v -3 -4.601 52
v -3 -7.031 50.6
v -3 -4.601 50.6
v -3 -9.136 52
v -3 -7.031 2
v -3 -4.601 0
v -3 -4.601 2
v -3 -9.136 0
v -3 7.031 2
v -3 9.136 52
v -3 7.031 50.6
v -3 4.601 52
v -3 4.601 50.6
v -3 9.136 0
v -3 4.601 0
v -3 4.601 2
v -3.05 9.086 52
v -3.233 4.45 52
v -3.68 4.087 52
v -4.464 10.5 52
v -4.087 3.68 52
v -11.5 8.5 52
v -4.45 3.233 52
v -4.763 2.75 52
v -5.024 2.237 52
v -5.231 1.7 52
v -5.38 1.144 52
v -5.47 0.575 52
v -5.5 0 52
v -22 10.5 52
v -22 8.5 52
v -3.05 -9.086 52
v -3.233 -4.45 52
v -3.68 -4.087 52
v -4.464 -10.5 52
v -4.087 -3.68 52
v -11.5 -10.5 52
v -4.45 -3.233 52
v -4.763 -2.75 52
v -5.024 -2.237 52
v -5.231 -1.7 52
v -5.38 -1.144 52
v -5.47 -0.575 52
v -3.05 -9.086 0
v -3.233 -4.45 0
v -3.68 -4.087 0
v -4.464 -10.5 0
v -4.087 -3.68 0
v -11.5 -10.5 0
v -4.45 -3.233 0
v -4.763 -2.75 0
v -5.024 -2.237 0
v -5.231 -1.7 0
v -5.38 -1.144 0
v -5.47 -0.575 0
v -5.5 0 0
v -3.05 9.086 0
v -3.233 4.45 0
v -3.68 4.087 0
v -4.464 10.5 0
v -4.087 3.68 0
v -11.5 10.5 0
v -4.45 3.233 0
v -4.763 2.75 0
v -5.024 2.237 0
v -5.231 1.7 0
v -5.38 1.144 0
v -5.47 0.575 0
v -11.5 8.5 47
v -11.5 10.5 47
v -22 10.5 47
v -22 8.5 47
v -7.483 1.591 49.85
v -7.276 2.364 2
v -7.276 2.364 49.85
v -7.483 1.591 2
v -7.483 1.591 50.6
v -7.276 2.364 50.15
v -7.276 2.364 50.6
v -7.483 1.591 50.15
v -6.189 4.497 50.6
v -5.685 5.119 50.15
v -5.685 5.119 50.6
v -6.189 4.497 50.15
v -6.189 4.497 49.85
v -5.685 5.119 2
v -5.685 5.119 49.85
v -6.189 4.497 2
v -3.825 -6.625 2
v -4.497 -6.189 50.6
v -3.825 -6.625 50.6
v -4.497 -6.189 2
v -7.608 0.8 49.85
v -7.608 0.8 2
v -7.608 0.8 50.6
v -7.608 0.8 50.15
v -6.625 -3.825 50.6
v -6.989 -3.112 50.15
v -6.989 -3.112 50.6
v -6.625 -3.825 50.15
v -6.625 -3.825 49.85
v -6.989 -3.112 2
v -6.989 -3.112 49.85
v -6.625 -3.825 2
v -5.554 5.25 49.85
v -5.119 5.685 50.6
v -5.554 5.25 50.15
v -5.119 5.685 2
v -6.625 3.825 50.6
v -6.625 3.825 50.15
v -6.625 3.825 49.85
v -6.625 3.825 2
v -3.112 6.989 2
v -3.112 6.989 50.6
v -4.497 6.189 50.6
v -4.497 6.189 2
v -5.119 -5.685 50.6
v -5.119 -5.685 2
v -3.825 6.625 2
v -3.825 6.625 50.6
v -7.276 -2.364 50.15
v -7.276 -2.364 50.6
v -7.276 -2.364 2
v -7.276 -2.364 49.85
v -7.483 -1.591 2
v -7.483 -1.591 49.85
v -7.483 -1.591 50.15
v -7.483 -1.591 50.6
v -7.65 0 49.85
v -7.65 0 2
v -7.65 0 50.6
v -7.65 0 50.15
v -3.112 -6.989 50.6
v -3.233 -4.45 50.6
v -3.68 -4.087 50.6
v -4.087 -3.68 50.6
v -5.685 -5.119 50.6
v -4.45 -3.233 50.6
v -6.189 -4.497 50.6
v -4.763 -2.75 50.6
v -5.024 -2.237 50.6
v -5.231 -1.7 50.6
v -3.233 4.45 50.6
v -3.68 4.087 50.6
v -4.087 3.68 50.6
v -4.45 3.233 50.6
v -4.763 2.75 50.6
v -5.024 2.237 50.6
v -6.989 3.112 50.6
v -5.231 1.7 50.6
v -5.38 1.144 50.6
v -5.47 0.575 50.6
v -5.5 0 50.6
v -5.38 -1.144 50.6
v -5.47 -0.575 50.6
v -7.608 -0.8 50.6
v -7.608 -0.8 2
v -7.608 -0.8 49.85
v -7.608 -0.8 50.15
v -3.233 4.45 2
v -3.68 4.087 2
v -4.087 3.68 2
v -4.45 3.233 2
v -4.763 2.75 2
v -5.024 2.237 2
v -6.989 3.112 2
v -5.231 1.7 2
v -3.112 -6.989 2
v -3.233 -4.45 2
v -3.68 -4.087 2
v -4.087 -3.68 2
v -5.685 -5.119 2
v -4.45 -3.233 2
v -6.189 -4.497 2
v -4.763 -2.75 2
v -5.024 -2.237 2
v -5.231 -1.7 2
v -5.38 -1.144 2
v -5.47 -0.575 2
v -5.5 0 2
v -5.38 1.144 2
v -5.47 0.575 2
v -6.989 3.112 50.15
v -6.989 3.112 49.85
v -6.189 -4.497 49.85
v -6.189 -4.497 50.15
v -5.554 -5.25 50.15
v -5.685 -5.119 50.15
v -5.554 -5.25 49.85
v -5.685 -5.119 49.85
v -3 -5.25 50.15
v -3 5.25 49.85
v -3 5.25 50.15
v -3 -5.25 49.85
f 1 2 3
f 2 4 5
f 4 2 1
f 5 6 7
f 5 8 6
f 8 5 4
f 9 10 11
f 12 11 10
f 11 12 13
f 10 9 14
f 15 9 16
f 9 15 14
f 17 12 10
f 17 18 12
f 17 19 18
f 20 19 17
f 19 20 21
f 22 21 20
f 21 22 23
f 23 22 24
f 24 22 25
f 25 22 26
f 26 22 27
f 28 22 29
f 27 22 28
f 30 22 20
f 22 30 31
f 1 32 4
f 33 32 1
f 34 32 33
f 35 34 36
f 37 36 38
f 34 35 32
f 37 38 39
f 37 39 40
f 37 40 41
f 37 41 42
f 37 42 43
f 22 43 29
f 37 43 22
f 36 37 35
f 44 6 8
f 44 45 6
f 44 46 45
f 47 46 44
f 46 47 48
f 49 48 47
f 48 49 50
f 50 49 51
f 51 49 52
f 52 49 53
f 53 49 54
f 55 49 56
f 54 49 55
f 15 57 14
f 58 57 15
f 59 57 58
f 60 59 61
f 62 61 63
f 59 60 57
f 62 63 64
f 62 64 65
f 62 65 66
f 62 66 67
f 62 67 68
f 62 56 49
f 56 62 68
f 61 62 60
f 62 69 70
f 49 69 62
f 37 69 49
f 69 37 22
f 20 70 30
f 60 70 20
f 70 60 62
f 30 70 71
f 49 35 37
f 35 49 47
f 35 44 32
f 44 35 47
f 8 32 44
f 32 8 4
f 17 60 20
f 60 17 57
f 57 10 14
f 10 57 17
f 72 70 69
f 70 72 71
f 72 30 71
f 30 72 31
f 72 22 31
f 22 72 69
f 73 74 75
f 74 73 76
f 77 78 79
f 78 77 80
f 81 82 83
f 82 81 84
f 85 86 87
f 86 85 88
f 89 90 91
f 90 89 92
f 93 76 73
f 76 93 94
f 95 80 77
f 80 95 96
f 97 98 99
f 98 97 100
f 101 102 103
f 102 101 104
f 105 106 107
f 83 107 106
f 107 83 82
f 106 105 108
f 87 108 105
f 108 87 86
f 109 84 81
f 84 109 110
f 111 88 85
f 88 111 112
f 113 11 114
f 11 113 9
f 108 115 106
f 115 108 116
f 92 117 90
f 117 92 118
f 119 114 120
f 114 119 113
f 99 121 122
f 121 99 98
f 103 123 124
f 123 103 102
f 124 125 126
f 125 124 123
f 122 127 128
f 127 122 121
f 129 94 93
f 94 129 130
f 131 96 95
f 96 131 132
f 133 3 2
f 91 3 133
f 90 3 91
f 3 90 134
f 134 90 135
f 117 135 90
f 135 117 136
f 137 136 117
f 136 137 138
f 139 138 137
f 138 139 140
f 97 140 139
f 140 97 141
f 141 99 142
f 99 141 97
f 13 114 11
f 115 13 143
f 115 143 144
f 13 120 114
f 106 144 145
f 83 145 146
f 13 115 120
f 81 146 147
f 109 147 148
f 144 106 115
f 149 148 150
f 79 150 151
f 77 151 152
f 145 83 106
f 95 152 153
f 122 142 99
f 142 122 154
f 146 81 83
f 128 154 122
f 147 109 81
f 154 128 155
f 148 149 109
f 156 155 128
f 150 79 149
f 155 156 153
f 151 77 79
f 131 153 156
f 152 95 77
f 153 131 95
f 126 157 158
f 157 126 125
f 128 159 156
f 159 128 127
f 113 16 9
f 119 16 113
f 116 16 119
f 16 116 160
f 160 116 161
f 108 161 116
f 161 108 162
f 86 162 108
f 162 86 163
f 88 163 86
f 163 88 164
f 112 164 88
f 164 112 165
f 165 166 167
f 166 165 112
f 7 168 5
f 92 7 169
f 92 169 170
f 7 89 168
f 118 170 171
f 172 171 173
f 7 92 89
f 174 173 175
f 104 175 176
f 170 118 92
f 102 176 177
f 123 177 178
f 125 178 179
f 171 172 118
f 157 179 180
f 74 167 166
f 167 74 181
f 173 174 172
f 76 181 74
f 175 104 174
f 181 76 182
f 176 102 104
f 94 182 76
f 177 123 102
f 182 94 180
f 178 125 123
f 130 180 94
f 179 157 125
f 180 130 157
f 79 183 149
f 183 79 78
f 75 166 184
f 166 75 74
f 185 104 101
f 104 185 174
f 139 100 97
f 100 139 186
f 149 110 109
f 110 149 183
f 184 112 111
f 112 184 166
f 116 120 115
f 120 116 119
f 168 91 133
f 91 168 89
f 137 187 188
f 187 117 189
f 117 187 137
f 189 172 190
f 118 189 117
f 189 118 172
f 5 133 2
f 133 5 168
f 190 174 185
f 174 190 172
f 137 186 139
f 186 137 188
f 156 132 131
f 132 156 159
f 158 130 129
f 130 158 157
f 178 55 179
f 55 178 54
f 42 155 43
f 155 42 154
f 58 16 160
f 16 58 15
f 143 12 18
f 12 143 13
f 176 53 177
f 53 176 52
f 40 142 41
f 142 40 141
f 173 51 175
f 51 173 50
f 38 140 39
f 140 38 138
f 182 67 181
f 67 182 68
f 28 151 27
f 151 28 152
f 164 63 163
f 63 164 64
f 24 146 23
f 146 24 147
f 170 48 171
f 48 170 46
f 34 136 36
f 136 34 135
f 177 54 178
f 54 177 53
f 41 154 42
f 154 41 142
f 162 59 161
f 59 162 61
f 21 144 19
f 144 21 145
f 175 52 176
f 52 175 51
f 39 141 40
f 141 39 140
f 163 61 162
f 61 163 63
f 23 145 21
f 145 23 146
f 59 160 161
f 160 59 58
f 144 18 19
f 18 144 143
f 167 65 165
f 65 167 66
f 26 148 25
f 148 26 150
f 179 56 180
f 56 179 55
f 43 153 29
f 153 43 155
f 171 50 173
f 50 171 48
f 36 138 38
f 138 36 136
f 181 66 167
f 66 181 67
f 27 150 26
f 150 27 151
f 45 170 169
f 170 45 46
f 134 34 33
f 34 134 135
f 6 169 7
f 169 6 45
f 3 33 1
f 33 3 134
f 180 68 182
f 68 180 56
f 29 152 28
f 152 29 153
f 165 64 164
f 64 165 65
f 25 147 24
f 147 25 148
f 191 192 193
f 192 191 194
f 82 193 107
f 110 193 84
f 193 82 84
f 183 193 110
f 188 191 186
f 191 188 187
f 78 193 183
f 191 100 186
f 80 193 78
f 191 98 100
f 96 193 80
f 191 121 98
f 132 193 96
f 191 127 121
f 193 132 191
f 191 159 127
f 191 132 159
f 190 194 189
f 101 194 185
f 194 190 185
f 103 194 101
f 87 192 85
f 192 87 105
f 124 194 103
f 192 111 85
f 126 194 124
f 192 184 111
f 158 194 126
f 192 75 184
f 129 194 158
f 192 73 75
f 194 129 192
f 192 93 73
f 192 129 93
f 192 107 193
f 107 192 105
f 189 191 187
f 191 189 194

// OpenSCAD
// PRUSA iteration3
// Bearing holders
// GNU GPL v3
// Josef Průša <iam@josefprusa.cz> and contributors
// http://www.reprap.org/wiki/Prusa_Mendel
// http://prusamendel.org

bearing_diameter = 15;
thinwall = 3;
bearing_size = bearing_diameter + 2 * thinwall;
tolerance = 0.15;
bearing_height = 52;

module horizontal_bearing_base(bearings=1) {
  translate(v=[0,0,6]) cube(size = [24,8+bearings*25,12], center = true);
}

module horizontal_bearing_holes(bearings=1) {
  cutter_lenght = 10+bearings*25;
  one_holder_lenght = 8+25;
  holder_lenght = 8+bearings*25;

  // Main bearing cut
  difference() {
    translate(v = [0,0,12]) rotate(a = [90,0,0]) translate(v = [0,0,-cutter_lenght/2]) cylinder(h = cutter_lenght, r = bearing_diameter/2, $fn = 50);
    // Bearing retainers
    translate(v=[0,1-holder_lenght/2,3]) cube(size = [24,6,8], center = true);
    translate(v=[0,-1+holder_lenght/2,3]) cube(size = [24,6,8], center = true);
  }

  // Ziptie cutouts
  ziptie_cut_ofset = 0;

  for (i = [0:bearings-1]) {
    // For easier positioning I move them by half of one
    // bearing holder then add each bearign lenght and then center again
    translate(v = [0,-holder_lenght/2,0]) translate(v = [0,one_holder_lenght/2+i*25,0]) difference(){
      union(){
        translate(v = [0,2-6,12]) rotate(a = [90,0,0]) translate(v = [0,0,0]) cylinder(h = 4, r = 12.5, $fn = 50);
        translate(v = [0,2+6,12]) rotate(a = [90,0,0]) translate(v = [0,0,0]) cylinder(h = 4, r = 12.5, $fn = 50);
      }
      translate(v = [0,10,12]) rotate(a = [90,0,0]) translate(v = [0,0,0]) cylinder(h = 24, r = 10, $fn = 50);
    }
  }
}

module horizontal_bearing_test() {
  difference(){
    horizontal_bearing_base(1);
    horizontal_bearing_holes(1);
  }
  translate(v=[30,0,0]) difference(){
    horizontal_bearing_base(2);
    horizontal_bearing_holes(2);
  }
  translate(v=[60,0,0]) difference(){
    horizontal_bearing_base(3);
    horizontal_bearing_holes(3);
  }
}



module vertical_bearing_base(height) {
  translate(v = [-bearing_size/2-3,bearing_size/2-1,height-2.5]) cube(size = [17,2,5], center = true);
  difference(){
  translate(v = [-2-bearing_size/4,0,height/2]) cube(size = [bearing_size/2-2,bearing_size,height], center = true);
  //cylinder(h = height, r=bearing_size/2, $fn = 90);
    //nice edge
   translate (v = [2.2-bearing_size/4,-bearing_size/2,height/2]) rotate ([0,0,45]) cube(size=[2,2,60],center=true);
   translate (v = [2.2-bearing_size/4,bearing_size/2,height/2]) rotate ([0,0,45]) cube(size=[2,2,60],center=true);  //translate(v = [-2-bearing_size/4,0,height/2]) 
  }    
}

module vertical_bearing_holes(height) {
  
  translate(v = [0,0,2]) cylinder(h = height+tolerance*2, r = bearing_diameter/2+tolerance, $fn = 60);
    //translate(v = [-bearing_diameter/2,0,height/2]) cube([4,bearing_diameter+2,10], center = true);
   translate(v = [0,0,-2]) cylinder(h = height*2, r = bearing_diameter/2-2, $fn = 60);
  
}

difference() {
  vertical_bearing_base(bearing_height);
  vertical_bearing_holes(bearing_height-3.70);
    
 }
translate(v = [-2-bearing_size/4,0,bearing_height-2]) cube(size = [bearing_size/2-2,bearing_size/2,tolerance*2], center = true) ;
//vertical_bearing_holes(50);
